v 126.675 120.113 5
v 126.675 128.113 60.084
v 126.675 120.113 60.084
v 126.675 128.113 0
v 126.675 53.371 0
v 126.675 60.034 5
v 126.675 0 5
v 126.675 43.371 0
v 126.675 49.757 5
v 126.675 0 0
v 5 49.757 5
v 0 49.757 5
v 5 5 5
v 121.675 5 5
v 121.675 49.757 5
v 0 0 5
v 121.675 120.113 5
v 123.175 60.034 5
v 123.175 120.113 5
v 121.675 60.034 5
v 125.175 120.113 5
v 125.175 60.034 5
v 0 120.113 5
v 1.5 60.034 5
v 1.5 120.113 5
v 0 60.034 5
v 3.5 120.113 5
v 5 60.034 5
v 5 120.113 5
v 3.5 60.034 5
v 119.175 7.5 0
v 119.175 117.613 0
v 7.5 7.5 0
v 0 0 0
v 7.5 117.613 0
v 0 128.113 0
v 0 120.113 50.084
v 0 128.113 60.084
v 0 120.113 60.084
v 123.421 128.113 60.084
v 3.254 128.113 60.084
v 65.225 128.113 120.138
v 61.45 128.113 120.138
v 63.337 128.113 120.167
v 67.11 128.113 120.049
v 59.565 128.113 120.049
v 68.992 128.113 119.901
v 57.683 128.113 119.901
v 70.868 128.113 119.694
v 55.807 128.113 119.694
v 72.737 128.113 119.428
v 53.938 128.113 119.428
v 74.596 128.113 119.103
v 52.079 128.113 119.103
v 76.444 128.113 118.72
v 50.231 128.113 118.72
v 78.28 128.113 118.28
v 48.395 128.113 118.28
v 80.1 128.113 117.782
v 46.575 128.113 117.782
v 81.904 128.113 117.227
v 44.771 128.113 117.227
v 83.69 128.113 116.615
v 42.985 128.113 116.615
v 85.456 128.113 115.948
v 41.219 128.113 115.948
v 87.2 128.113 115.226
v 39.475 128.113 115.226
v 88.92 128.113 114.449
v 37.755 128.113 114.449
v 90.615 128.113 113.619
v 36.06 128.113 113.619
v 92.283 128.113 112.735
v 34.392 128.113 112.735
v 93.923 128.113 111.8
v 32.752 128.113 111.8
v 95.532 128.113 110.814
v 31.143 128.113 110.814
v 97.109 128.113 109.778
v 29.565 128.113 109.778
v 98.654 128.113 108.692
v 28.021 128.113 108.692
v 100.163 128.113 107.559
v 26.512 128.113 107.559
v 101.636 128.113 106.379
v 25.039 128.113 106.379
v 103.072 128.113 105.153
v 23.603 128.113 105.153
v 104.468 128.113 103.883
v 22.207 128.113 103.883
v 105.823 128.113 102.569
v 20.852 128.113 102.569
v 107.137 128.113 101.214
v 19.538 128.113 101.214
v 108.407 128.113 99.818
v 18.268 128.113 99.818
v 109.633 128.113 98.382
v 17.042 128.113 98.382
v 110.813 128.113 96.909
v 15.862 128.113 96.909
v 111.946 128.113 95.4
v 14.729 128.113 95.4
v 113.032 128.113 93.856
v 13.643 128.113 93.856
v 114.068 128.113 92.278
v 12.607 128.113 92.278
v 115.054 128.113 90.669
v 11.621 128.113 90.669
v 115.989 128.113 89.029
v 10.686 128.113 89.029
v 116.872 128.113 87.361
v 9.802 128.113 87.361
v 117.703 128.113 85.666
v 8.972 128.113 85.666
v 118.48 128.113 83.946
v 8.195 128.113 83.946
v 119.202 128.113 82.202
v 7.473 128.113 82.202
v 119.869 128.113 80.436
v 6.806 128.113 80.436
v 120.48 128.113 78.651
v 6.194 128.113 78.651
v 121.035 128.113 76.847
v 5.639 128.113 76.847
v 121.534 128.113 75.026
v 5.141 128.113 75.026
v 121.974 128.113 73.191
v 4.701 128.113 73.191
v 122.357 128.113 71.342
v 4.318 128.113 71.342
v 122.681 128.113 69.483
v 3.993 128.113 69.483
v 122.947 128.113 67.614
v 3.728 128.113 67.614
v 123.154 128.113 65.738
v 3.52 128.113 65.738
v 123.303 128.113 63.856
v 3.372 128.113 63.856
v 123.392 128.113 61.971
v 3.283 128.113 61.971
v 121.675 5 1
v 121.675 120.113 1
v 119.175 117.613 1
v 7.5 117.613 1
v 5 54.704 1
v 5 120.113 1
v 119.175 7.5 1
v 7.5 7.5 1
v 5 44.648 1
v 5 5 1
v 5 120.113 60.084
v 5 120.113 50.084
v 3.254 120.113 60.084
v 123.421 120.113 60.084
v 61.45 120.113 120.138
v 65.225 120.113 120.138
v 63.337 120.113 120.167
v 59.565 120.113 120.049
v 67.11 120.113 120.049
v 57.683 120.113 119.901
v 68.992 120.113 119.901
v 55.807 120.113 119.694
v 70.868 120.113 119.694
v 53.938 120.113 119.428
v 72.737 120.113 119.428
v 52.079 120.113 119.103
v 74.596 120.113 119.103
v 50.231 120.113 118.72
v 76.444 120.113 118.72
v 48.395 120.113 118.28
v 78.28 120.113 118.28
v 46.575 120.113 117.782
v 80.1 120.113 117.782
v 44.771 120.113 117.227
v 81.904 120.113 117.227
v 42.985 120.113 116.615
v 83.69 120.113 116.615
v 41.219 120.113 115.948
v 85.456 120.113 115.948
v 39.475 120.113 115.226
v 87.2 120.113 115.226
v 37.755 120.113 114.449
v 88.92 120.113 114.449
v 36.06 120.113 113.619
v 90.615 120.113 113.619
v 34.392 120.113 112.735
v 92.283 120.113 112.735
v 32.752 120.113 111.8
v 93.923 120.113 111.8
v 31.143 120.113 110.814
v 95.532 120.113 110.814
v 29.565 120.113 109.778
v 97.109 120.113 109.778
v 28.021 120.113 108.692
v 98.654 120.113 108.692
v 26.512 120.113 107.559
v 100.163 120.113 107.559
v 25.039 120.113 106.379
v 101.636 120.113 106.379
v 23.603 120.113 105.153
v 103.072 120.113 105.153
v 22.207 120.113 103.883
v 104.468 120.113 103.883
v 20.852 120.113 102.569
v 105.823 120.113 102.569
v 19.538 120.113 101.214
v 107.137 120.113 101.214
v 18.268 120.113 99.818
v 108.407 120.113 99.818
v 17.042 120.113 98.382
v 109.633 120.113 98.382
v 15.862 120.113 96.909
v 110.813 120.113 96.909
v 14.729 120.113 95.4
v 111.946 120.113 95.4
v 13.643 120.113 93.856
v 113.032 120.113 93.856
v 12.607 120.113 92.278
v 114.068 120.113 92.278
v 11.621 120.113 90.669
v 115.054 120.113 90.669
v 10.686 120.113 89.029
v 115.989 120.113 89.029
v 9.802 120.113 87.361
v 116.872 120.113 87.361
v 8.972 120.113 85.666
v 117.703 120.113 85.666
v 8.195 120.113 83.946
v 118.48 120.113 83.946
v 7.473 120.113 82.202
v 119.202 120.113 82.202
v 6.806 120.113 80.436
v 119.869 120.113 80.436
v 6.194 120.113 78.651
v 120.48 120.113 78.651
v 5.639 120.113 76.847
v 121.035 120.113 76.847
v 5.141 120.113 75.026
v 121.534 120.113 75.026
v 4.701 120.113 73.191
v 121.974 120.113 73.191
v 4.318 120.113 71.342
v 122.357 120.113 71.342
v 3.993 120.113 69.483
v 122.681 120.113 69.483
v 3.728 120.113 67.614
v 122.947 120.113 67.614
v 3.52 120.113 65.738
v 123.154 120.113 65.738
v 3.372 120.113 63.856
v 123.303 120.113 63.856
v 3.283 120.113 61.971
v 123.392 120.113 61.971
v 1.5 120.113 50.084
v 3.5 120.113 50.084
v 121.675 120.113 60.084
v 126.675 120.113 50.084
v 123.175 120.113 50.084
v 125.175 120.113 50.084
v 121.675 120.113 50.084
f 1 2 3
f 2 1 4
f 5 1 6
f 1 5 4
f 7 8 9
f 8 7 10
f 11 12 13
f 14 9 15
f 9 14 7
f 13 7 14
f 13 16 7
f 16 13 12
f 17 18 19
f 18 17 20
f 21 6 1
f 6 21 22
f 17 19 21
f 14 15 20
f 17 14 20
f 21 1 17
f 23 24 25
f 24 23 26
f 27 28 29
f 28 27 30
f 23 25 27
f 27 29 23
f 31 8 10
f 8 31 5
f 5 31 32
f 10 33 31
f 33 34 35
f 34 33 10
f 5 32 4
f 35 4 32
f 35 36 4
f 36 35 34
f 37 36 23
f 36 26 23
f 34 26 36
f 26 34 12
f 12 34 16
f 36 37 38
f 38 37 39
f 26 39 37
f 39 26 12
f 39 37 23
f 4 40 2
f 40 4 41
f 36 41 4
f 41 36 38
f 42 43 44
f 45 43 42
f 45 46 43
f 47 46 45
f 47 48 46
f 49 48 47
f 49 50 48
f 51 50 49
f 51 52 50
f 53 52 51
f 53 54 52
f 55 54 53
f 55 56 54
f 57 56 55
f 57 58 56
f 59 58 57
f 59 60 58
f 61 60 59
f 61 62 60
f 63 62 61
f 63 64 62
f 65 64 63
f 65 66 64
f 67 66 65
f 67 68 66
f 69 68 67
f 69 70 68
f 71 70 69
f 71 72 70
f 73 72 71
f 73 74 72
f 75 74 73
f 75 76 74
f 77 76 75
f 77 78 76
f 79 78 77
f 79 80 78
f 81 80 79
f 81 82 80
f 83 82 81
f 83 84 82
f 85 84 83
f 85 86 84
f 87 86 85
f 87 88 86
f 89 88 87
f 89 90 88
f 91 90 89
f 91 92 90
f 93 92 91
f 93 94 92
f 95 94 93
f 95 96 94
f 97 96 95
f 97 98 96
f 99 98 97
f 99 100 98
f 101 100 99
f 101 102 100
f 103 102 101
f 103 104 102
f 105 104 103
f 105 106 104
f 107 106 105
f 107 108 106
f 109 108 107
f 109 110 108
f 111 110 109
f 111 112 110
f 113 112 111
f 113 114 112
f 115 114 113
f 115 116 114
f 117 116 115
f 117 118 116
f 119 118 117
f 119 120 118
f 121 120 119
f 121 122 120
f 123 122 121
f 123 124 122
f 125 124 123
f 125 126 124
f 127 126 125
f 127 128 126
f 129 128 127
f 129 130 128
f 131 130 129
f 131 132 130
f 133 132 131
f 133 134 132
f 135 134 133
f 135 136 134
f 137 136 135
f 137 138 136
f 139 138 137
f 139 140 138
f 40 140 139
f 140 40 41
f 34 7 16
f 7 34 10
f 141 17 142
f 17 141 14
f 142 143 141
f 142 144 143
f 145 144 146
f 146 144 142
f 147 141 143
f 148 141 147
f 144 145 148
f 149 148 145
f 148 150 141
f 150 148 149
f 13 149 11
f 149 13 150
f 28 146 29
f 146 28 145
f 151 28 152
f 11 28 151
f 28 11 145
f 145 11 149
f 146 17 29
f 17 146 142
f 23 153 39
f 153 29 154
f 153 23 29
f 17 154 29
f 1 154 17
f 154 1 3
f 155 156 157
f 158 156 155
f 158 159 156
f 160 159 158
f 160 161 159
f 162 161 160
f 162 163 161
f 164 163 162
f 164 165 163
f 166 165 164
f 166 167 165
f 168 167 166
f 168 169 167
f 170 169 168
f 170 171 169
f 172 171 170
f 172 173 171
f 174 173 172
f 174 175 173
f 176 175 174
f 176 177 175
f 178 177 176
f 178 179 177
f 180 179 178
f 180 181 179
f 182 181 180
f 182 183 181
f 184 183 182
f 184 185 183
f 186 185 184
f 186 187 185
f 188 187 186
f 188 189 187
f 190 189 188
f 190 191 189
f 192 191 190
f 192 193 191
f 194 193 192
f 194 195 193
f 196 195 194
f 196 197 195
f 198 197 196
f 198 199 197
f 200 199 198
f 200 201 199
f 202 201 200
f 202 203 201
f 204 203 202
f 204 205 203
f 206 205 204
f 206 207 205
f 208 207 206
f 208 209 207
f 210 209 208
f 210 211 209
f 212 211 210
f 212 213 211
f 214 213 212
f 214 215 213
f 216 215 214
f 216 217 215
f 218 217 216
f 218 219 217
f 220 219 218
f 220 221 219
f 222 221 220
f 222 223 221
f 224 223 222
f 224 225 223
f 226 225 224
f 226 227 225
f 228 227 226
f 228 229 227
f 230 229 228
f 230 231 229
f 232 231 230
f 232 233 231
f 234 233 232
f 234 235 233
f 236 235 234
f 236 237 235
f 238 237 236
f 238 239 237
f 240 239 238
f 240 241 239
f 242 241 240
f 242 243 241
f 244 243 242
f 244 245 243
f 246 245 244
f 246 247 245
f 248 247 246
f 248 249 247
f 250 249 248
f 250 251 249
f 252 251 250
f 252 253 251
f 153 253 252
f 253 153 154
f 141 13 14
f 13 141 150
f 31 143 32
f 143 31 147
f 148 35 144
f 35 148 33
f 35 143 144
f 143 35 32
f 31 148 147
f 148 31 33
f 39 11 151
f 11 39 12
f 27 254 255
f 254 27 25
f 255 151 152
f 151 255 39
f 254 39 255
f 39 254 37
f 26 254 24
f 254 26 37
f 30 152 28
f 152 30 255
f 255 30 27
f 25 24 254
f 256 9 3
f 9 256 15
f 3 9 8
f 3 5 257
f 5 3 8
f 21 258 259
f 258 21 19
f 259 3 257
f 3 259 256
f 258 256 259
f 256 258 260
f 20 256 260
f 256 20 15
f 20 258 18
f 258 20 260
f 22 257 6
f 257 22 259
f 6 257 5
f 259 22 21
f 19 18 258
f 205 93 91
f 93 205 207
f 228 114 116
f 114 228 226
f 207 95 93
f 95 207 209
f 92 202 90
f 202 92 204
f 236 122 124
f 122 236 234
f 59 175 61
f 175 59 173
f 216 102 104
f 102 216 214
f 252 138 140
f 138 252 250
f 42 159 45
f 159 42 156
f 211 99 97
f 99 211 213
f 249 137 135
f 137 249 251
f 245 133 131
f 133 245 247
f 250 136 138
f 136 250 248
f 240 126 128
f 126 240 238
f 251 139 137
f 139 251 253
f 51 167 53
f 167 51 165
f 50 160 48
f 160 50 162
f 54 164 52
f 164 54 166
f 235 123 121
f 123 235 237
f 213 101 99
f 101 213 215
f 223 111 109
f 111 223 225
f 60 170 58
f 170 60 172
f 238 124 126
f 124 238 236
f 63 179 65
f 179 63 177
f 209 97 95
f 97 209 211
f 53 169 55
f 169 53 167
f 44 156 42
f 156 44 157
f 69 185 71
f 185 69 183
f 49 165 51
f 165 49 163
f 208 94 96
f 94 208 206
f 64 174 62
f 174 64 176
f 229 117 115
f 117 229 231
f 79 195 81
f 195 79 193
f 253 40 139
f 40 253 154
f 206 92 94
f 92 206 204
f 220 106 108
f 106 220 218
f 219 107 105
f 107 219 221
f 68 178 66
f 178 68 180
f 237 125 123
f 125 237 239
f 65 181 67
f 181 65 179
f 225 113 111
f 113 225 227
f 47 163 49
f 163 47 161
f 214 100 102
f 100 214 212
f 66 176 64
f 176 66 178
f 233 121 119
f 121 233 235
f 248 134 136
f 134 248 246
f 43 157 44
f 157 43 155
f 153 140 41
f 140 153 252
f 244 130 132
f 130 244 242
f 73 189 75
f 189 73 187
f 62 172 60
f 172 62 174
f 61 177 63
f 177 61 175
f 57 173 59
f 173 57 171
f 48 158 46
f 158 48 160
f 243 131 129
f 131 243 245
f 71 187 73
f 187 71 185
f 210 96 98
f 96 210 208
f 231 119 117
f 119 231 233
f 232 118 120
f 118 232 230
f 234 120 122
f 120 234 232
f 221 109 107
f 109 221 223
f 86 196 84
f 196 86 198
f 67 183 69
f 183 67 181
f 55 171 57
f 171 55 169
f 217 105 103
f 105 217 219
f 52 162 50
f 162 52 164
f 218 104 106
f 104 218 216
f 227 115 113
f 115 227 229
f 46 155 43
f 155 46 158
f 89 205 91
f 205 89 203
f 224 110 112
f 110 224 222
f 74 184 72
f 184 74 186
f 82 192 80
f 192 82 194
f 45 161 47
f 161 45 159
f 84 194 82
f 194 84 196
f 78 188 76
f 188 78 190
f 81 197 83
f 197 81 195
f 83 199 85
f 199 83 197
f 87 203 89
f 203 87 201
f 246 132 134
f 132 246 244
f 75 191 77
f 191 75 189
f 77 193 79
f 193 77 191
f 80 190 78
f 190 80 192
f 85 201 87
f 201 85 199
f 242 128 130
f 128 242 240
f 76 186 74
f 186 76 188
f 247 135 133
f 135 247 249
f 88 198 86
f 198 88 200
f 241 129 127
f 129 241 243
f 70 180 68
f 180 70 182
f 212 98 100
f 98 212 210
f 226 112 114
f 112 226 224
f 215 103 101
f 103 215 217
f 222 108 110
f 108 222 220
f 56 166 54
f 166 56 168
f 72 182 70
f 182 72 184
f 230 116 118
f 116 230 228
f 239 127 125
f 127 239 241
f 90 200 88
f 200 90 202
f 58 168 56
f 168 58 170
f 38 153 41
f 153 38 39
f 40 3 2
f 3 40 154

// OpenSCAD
in = 25.4;

$fn = 200;

//x = 2.7745 * in;
x = 4.5935 * in;
y = 4.5320 * in;

lip_width = 1;
lip_border = 2.5;

border_width = 4 + lip_width;
border = 5;
top_thickness = 8;

pad_d = 4.7310 * in;
strut_width = 10;

difference() {
  cube([x+border*2, y+border+top_thickness, border_width]);
  
  translate([border, border, lip_width])
  cube([x, y, 10]);
  
  translate([border+lip_border, border+lip_border, -1])
  cube([x-lip_border*2, y-lip_border*2, 10]);
}

translate([x/2+border, y+border, pad_d/2])
rotate([-90, 0, 0])
cylinder(r=pad_d/2, h=top_thickness);

translate([0, y+border, 0])
cube([x+border*2, top_thickness, pad_d/2]);

for (i = [0, x+border]) {
  support_height = y*2/3;
  translate([i, y-support_height+border, 0])
  rotate([0, 0, 0])
  union () {
    translate([(border-2)/2, 0, 0])
    prism(2, support_height, pad_d/2);

    difference () {
      prism(border, support_height, pad_d/2);
      
      translate([-1, strut_width, 0])
      prism(border*2, support_height-strut_width, pad_d/2-strut_width);
    }
  }
}

module prism(l, w, h) {
  polyhedron(
    points=[[0,0,0], [l,0,0], [l,w,0], [0,w,0], [0,w,h], [l,w,h]],
    faces=[[0,1,2,3],[5,4,3,2],[0,4,5,1],[0,3,4],[5,2,1]]
  );
}
